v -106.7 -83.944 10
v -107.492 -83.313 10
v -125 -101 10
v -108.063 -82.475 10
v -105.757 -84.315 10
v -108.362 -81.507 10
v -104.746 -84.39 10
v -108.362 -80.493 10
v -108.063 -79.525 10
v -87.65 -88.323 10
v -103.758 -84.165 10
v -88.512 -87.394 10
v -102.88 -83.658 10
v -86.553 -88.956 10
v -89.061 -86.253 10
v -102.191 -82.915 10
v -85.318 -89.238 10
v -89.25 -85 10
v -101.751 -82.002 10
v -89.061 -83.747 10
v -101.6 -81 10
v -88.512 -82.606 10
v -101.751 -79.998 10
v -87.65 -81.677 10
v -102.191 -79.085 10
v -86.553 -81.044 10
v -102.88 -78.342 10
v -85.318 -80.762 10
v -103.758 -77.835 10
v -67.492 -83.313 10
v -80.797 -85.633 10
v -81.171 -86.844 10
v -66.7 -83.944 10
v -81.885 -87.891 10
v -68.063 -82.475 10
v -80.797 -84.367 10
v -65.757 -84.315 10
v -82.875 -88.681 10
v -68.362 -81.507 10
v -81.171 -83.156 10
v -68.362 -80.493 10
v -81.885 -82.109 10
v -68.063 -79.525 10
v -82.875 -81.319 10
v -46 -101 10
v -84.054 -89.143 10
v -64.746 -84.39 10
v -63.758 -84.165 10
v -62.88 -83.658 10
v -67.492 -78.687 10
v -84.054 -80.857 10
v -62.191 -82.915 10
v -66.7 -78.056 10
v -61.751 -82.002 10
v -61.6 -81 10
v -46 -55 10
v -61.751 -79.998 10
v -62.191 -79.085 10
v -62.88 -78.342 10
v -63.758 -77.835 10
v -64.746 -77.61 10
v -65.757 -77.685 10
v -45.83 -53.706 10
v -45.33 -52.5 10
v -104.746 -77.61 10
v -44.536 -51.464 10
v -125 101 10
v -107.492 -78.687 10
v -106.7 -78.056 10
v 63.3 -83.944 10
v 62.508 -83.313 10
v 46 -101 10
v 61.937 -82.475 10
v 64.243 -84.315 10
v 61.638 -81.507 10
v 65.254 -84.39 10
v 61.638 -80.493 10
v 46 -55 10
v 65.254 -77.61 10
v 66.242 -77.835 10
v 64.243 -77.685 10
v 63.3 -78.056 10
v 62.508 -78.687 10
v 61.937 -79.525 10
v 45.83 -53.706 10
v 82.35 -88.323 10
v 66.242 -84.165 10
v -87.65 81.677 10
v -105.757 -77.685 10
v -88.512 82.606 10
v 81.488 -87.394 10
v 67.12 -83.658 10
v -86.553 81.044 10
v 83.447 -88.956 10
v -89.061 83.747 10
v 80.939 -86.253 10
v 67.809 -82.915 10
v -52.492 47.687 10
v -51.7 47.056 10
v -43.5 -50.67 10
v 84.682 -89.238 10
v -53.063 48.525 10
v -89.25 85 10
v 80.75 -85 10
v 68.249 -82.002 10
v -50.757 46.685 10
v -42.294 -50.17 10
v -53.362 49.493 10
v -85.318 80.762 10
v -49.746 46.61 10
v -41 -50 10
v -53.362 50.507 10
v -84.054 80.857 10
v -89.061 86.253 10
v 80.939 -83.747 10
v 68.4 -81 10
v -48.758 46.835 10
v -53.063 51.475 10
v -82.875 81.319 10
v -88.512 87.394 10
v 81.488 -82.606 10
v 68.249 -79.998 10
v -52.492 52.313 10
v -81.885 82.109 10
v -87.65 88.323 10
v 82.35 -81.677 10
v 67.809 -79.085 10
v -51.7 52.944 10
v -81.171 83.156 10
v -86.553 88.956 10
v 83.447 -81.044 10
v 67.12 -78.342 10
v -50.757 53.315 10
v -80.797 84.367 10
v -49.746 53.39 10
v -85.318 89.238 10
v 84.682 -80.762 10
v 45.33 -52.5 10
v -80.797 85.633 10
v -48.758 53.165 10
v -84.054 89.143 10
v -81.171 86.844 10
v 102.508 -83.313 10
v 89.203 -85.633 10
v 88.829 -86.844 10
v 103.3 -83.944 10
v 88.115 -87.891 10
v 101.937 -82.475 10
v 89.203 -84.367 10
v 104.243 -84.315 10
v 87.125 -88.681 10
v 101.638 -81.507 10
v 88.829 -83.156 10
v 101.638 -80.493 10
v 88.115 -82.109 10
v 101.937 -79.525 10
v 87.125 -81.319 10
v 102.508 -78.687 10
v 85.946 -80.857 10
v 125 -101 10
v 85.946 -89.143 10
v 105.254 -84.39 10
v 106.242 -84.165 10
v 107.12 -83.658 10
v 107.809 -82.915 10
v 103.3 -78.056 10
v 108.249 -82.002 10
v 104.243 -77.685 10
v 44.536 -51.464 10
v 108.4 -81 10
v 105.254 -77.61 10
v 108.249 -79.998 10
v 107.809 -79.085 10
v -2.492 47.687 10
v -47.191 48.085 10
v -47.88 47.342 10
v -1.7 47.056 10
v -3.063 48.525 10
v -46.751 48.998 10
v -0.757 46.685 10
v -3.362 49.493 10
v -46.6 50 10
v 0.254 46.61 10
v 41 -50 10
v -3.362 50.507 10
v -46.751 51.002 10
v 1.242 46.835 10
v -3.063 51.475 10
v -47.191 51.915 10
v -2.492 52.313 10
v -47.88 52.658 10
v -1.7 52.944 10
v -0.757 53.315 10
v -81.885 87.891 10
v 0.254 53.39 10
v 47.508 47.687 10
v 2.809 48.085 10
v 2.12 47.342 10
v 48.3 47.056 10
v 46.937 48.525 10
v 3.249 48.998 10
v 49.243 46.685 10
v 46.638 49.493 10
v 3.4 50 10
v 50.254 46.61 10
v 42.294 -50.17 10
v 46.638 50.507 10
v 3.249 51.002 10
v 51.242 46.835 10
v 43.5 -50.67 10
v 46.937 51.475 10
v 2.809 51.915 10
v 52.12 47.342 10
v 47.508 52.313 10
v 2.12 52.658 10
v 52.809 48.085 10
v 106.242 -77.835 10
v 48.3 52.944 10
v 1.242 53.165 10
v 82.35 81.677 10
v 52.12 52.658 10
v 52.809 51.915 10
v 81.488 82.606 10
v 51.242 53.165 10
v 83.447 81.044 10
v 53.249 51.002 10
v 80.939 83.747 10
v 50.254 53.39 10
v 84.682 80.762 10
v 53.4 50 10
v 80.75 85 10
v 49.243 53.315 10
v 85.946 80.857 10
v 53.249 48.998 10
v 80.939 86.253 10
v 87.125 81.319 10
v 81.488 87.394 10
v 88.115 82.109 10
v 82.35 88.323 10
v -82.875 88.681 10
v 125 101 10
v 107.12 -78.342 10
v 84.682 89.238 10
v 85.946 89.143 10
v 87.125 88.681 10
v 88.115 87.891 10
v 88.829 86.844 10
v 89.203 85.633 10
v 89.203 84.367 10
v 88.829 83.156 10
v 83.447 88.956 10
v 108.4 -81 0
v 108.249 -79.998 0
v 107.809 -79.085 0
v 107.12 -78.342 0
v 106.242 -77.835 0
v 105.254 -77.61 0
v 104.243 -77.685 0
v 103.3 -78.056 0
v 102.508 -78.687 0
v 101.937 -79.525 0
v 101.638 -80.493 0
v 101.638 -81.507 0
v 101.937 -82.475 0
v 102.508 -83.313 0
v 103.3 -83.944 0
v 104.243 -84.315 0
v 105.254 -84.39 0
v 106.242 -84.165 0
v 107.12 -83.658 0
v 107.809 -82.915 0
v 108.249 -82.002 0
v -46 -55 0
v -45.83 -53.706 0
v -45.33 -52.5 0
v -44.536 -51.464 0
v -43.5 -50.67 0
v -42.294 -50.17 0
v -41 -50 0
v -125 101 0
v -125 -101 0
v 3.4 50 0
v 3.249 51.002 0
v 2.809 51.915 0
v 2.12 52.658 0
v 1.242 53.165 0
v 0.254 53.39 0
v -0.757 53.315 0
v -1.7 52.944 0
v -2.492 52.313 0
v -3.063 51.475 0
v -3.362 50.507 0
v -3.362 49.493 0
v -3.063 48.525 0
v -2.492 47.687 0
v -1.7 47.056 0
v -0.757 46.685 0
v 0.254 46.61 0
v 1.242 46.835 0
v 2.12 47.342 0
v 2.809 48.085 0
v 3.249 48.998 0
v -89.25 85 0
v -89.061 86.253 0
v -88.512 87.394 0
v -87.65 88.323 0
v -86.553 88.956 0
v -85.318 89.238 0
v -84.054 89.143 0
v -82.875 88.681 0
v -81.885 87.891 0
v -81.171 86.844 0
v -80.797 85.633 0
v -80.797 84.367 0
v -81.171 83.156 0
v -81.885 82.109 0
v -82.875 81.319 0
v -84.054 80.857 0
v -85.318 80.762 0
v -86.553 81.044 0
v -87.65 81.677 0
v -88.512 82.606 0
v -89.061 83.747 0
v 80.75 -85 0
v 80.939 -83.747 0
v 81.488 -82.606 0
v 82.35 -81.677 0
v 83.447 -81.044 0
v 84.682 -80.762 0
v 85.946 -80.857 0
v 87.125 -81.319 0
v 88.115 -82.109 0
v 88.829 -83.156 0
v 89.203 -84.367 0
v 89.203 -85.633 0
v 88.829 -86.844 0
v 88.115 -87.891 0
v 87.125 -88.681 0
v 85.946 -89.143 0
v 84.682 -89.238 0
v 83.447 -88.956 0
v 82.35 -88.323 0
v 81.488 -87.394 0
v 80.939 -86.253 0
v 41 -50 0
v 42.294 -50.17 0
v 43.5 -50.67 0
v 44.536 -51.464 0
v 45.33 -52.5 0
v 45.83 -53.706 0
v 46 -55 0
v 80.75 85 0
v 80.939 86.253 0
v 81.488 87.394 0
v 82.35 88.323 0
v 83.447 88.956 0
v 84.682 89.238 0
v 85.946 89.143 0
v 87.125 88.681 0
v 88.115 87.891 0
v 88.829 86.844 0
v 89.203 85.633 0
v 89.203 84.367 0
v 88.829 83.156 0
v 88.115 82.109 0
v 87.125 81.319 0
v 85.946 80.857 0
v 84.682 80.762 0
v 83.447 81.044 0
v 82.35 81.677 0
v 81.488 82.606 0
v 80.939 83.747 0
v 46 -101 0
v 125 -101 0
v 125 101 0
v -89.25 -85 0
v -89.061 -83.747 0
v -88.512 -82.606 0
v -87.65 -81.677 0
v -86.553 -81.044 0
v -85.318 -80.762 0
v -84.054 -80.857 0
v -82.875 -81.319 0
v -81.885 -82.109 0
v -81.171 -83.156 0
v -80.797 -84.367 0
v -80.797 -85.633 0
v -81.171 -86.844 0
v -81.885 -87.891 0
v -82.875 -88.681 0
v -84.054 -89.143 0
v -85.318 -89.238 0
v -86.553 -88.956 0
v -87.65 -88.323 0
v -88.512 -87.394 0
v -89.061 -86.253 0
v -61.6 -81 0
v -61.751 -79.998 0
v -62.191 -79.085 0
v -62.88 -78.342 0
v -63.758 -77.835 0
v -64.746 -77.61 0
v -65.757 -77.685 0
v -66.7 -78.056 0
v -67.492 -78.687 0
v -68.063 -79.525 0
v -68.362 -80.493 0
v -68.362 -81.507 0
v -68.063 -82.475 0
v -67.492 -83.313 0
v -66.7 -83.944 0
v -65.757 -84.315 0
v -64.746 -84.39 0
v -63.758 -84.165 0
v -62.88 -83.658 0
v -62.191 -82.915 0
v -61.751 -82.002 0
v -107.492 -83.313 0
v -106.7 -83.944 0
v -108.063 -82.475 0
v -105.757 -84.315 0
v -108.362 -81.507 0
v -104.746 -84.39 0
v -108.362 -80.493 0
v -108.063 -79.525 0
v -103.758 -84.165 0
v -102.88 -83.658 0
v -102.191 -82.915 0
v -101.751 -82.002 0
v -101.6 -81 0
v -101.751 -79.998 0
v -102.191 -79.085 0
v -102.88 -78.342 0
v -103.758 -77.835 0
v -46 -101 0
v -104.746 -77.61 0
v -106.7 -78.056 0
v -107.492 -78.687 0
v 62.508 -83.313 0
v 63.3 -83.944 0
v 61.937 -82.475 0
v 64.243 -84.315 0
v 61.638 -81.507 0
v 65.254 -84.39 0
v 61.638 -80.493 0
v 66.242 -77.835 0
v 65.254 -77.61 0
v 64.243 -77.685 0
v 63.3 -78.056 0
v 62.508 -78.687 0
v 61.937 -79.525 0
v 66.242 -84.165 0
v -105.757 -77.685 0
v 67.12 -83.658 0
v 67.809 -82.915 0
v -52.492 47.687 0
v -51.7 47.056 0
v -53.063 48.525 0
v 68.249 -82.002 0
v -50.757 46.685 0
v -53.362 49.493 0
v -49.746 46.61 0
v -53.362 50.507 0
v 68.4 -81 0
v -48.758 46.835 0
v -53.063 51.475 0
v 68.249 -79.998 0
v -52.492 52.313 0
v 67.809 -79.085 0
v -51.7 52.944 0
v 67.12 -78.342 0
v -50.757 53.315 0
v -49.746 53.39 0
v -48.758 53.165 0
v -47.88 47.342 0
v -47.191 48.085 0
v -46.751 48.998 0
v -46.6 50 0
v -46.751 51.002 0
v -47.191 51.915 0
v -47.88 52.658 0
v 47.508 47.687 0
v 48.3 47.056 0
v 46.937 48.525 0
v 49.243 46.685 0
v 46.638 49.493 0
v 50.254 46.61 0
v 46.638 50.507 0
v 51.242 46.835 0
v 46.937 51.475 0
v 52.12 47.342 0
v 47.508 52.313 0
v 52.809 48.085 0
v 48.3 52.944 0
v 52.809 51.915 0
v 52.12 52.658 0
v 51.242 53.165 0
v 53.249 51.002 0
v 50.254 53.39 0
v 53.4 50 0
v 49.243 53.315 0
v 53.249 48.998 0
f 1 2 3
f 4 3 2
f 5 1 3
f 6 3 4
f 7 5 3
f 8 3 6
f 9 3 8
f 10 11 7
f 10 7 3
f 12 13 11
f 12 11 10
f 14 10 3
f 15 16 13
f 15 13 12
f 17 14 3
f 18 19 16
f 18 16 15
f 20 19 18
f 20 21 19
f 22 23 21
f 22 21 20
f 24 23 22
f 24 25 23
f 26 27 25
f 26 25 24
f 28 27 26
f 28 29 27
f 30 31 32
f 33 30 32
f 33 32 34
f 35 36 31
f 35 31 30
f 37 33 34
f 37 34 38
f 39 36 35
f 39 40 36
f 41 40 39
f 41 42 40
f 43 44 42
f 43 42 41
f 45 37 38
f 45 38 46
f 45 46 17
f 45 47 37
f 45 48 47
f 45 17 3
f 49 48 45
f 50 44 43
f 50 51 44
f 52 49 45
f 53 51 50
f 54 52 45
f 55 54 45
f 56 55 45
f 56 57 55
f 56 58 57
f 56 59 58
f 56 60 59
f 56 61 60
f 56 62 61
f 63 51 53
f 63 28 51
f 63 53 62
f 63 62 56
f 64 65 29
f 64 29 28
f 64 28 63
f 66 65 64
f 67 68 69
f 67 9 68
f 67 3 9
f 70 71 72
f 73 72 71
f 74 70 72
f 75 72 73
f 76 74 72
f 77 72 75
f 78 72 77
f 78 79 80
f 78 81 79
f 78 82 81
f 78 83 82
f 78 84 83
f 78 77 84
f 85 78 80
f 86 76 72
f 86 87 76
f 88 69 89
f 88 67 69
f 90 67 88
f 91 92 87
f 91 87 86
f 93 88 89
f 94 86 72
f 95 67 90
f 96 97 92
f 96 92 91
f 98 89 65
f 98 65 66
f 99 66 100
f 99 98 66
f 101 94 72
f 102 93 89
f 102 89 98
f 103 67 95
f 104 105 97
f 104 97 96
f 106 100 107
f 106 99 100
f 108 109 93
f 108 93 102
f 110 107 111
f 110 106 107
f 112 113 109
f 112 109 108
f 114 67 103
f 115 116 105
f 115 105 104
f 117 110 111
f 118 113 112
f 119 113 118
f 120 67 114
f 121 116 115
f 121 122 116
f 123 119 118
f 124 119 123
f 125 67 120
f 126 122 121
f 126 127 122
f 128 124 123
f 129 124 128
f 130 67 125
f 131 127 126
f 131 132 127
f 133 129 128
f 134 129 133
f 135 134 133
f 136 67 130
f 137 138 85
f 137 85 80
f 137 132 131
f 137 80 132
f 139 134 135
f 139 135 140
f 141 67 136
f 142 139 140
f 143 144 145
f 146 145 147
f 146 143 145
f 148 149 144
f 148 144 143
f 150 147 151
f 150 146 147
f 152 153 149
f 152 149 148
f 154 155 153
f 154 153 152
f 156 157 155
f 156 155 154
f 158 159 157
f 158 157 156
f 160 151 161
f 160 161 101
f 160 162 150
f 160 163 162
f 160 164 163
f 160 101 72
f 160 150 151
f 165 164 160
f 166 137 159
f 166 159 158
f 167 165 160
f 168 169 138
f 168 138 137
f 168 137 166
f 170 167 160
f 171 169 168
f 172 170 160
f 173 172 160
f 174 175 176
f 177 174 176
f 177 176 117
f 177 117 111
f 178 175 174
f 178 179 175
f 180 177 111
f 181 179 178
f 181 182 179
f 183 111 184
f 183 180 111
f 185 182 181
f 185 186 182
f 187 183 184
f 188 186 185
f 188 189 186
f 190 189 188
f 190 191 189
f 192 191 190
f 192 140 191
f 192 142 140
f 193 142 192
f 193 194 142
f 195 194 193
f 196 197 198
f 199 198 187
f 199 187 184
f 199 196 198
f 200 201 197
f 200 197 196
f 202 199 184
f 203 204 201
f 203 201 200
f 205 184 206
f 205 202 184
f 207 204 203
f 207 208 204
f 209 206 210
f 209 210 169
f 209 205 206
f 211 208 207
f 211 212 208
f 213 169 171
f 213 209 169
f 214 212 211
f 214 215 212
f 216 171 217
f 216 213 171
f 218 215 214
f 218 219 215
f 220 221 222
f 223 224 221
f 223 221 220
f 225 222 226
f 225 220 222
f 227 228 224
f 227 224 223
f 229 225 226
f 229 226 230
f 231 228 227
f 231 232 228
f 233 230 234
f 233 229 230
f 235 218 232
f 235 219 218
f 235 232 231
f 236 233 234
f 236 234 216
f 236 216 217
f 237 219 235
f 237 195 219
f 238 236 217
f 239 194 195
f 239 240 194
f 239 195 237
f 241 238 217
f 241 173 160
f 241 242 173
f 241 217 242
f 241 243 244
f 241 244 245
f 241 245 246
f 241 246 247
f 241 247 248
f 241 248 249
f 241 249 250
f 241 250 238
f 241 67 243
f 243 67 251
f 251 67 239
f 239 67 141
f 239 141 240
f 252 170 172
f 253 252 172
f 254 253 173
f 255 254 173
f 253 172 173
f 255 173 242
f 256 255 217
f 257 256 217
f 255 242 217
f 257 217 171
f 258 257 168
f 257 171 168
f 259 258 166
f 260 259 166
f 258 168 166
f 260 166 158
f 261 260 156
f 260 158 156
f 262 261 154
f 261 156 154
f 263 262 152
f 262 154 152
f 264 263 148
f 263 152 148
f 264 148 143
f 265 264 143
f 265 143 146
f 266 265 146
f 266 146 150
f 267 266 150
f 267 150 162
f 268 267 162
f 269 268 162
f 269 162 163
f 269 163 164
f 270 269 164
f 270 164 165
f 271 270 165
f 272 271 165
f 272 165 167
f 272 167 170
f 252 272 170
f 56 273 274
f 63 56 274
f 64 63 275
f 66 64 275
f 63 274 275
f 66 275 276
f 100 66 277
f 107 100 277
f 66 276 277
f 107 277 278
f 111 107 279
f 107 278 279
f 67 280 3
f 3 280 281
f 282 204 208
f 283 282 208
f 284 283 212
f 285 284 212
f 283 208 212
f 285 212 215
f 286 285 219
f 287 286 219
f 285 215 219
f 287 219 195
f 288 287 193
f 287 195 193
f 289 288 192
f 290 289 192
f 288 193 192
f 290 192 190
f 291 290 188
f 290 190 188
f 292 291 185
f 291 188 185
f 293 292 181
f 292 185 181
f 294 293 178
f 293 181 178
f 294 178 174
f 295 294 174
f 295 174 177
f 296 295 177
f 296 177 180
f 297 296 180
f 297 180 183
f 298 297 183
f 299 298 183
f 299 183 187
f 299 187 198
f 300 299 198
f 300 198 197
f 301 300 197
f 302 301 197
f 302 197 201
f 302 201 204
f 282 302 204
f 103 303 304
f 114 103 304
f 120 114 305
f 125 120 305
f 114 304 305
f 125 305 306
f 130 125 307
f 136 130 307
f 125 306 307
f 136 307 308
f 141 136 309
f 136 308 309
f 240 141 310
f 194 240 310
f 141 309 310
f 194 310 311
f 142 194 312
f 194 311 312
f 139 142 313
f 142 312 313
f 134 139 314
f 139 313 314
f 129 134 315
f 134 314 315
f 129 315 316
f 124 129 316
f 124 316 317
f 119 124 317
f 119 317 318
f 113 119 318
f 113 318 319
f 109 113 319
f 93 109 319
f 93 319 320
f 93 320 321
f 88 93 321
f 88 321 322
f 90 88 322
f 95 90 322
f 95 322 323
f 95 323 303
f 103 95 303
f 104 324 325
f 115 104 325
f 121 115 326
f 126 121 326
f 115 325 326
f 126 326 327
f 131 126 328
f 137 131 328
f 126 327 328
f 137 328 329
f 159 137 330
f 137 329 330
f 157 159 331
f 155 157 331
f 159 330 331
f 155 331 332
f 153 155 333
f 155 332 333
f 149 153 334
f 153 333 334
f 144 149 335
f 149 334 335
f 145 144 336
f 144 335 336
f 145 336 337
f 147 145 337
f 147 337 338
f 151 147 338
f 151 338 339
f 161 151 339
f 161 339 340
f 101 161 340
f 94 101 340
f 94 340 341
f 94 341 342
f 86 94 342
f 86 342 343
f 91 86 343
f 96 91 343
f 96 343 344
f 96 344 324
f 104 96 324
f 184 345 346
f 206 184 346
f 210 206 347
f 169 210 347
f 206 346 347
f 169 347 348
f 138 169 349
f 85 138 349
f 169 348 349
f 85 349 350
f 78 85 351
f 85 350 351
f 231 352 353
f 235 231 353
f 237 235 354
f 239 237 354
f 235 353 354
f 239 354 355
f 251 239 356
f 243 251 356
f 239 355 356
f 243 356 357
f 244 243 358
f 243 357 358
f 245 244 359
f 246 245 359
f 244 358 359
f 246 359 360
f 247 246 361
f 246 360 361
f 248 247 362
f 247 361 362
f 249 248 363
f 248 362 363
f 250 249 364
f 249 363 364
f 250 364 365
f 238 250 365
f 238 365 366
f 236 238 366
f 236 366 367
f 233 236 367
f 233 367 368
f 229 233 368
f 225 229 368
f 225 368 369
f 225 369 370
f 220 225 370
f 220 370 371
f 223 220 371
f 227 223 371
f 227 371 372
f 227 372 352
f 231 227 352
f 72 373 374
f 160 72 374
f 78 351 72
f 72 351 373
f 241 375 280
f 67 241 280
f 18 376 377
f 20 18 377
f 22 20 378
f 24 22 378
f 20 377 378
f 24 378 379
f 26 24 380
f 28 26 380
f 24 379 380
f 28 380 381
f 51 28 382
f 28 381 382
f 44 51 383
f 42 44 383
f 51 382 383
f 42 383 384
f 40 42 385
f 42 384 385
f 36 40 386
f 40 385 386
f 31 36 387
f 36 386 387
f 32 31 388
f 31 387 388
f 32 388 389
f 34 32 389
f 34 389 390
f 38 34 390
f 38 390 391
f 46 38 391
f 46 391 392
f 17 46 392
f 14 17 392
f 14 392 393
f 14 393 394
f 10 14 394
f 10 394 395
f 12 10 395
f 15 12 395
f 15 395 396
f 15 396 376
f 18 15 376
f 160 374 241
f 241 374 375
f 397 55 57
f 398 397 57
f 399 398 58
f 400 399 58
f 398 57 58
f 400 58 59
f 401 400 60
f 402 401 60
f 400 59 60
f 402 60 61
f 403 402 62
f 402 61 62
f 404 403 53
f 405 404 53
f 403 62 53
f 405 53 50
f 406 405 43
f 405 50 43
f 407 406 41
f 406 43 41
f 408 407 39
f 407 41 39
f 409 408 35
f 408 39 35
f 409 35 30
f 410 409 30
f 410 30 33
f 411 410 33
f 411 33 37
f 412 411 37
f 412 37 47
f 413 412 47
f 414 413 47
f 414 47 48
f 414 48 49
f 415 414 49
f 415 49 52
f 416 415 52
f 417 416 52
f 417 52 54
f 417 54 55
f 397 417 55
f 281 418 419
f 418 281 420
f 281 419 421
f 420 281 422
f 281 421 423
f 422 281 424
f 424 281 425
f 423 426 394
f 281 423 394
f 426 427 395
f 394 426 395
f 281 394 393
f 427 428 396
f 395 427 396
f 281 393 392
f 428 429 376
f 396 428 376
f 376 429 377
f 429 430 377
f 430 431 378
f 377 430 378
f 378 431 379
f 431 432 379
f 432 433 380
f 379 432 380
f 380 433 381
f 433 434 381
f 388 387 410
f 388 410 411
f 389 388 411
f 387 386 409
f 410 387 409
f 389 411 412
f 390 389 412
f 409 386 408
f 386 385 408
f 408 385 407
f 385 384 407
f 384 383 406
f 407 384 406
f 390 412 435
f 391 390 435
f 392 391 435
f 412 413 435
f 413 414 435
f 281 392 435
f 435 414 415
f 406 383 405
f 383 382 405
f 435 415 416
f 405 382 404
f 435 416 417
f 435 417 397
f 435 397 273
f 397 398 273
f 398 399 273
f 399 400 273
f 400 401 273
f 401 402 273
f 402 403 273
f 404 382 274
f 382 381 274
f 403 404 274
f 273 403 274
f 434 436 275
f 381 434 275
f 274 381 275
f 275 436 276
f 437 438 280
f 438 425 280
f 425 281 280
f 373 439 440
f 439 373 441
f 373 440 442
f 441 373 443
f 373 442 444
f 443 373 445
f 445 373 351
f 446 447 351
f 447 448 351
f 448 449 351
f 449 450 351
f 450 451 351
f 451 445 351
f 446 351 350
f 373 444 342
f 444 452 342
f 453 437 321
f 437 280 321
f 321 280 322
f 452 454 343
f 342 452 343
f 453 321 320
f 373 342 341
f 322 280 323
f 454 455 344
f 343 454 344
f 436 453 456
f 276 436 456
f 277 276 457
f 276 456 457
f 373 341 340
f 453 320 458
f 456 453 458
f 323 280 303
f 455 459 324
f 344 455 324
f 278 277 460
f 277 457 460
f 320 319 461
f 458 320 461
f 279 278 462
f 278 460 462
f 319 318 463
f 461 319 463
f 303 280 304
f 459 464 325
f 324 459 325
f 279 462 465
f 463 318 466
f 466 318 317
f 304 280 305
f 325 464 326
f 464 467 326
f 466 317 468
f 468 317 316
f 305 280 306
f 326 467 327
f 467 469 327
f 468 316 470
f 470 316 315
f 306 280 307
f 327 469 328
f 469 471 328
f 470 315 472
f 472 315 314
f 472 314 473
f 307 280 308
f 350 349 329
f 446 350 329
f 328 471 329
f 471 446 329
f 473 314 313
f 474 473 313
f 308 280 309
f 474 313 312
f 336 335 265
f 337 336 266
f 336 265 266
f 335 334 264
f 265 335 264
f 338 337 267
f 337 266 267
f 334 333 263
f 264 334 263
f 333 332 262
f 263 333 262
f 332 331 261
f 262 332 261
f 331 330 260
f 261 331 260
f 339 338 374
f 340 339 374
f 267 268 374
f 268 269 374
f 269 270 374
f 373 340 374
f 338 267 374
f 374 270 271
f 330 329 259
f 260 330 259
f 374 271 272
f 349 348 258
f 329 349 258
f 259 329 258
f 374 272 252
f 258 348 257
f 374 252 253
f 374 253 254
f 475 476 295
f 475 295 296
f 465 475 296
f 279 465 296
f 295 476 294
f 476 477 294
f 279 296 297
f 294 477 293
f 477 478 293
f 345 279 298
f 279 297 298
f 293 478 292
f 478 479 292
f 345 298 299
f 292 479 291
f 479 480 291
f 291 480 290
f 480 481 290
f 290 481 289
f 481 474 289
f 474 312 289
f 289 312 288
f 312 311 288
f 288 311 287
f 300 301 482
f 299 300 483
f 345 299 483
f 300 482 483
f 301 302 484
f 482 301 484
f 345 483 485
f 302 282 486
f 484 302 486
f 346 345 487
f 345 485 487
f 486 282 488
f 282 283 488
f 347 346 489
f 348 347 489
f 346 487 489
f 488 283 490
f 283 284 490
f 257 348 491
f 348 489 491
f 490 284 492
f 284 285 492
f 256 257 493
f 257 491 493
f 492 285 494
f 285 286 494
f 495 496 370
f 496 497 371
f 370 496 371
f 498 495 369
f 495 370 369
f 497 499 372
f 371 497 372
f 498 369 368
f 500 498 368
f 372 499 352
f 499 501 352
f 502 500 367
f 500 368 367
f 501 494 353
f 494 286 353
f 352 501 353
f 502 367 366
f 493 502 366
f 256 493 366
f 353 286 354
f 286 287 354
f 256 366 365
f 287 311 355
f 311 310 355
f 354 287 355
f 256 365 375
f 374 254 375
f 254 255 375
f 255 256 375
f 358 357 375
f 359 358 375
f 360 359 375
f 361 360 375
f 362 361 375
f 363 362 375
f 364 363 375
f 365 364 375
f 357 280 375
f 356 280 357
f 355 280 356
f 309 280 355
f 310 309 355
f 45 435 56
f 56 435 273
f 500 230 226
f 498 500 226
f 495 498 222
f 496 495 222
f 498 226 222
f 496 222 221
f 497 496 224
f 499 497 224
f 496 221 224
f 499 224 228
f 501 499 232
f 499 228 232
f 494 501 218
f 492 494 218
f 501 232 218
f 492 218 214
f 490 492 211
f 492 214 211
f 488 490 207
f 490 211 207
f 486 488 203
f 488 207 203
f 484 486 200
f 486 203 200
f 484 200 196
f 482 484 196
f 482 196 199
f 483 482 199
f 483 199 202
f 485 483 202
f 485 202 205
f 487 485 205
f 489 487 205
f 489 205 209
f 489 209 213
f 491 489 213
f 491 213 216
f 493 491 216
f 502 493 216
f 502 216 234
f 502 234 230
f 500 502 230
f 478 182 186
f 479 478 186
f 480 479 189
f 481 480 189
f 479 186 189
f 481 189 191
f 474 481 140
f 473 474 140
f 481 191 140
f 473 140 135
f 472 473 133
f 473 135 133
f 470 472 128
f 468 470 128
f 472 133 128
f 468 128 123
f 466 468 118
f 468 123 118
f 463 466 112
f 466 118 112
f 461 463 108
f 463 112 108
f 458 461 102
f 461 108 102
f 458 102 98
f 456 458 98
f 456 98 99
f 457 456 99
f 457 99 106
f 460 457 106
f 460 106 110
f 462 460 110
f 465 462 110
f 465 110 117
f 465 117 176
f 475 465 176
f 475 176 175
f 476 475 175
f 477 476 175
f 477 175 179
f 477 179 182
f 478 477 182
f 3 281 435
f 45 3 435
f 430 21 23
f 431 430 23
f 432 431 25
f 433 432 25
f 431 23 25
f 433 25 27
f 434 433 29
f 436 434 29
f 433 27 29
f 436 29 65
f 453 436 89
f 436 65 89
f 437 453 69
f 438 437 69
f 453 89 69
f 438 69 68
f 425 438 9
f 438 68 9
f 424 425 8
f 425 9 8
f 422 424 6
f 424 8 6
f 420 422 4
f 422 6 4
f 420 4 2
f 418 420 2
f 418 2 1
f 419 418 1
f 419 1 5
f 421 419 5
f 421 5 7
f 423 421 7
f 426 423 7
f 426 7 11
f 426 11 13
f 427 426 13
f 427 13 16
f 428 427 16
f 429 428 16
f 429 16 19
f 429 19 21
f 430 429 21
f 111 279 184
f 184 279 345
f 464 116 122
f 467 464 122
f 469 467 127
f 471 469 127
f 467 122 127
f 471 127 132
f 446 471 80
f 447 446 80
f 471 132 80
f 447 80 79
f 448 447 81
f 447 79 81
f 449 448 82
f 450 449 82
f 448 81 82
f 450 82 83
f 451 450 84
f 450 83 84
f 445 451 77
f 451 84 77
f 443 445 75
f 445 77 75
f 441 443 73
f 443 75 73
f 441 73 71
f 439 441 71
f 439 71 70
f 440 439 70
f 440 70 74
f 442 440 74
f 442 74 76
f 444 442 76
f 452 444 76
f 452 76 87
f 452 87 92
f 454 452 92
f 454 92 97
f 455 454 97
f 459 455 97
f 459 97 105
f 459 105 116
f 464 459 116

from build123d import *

# Parameters (mm, degrees)
SKETCH_1_R          = 4
EXTRUDE_1_DEPTH     = 10
HOLE_WIZARD_M10_1_D = 8.5
HOLE_WIZARD_M8_1_D  = 6.8


with BuildPart() as part:
    # 草图1 → 凸台-拉伸1 (new body)
    with BuildSketch(Plane.XY):
        with BuildLine():
            Line((125, -101), (125, 101))
            Line((125, 101), (-125, 101))
            Line((-125, 101), (-125, -101))
            Line((-125, -101), (-46, -101))
            Line((-46, -101), (-46, -55))
            ThreePointArc((-46, -55), (-44.535533906, -51.464466094), (-41, -50))
            Line((-41, -50), (41, -50))
            ThreePointArc((41, -50), (44.535533906, -51.464466094), (46, -55))
            Line((46, -55), (46, -101))
            Line((46, -101), (125, -101))
        make_face()
        with Locations((-85, -85)):
            Circle(SKETCH_1_R, mode=Mode.SUBTRACT)
        with Locations((85, -85)):
            Circle(SKETCH_1_R, mode=Mode.SUBTRACT)
        with Locations((-85, 85)):
            Circle(SKETCH_1_R, mode=Mode.SUBTRACT)
        with Locations((85, 85)):
            Circle(SKETCH_1_R, mode=Mode.SUBTRACT)
    extrude(amount=EXTRUDE_1_DEPTH)

    # M10 螺纹孔1 (through all)
    with Locations(Plane.XY.offset(10)):
        with Locations((85, -85), (-85, -85), (-85, 85), (85, 85)):
            Hole(HOLE_WIZARD_M10_1_D / 2)

    # M8 螺纹孔1 (through all)
    with Locations(Plane(origin=(0, 0, 0), x_dir=(-1, 0, 0), z_dir=(0, 0, -1))):
        with Locations((-50, 50), (0, 50), (50, 50), (-105, -81), (-65, -81), (65, -81), (105, -81)):
            Hole(HOLE_WIZARD_M8_1_D / 2)


solid = part.part
